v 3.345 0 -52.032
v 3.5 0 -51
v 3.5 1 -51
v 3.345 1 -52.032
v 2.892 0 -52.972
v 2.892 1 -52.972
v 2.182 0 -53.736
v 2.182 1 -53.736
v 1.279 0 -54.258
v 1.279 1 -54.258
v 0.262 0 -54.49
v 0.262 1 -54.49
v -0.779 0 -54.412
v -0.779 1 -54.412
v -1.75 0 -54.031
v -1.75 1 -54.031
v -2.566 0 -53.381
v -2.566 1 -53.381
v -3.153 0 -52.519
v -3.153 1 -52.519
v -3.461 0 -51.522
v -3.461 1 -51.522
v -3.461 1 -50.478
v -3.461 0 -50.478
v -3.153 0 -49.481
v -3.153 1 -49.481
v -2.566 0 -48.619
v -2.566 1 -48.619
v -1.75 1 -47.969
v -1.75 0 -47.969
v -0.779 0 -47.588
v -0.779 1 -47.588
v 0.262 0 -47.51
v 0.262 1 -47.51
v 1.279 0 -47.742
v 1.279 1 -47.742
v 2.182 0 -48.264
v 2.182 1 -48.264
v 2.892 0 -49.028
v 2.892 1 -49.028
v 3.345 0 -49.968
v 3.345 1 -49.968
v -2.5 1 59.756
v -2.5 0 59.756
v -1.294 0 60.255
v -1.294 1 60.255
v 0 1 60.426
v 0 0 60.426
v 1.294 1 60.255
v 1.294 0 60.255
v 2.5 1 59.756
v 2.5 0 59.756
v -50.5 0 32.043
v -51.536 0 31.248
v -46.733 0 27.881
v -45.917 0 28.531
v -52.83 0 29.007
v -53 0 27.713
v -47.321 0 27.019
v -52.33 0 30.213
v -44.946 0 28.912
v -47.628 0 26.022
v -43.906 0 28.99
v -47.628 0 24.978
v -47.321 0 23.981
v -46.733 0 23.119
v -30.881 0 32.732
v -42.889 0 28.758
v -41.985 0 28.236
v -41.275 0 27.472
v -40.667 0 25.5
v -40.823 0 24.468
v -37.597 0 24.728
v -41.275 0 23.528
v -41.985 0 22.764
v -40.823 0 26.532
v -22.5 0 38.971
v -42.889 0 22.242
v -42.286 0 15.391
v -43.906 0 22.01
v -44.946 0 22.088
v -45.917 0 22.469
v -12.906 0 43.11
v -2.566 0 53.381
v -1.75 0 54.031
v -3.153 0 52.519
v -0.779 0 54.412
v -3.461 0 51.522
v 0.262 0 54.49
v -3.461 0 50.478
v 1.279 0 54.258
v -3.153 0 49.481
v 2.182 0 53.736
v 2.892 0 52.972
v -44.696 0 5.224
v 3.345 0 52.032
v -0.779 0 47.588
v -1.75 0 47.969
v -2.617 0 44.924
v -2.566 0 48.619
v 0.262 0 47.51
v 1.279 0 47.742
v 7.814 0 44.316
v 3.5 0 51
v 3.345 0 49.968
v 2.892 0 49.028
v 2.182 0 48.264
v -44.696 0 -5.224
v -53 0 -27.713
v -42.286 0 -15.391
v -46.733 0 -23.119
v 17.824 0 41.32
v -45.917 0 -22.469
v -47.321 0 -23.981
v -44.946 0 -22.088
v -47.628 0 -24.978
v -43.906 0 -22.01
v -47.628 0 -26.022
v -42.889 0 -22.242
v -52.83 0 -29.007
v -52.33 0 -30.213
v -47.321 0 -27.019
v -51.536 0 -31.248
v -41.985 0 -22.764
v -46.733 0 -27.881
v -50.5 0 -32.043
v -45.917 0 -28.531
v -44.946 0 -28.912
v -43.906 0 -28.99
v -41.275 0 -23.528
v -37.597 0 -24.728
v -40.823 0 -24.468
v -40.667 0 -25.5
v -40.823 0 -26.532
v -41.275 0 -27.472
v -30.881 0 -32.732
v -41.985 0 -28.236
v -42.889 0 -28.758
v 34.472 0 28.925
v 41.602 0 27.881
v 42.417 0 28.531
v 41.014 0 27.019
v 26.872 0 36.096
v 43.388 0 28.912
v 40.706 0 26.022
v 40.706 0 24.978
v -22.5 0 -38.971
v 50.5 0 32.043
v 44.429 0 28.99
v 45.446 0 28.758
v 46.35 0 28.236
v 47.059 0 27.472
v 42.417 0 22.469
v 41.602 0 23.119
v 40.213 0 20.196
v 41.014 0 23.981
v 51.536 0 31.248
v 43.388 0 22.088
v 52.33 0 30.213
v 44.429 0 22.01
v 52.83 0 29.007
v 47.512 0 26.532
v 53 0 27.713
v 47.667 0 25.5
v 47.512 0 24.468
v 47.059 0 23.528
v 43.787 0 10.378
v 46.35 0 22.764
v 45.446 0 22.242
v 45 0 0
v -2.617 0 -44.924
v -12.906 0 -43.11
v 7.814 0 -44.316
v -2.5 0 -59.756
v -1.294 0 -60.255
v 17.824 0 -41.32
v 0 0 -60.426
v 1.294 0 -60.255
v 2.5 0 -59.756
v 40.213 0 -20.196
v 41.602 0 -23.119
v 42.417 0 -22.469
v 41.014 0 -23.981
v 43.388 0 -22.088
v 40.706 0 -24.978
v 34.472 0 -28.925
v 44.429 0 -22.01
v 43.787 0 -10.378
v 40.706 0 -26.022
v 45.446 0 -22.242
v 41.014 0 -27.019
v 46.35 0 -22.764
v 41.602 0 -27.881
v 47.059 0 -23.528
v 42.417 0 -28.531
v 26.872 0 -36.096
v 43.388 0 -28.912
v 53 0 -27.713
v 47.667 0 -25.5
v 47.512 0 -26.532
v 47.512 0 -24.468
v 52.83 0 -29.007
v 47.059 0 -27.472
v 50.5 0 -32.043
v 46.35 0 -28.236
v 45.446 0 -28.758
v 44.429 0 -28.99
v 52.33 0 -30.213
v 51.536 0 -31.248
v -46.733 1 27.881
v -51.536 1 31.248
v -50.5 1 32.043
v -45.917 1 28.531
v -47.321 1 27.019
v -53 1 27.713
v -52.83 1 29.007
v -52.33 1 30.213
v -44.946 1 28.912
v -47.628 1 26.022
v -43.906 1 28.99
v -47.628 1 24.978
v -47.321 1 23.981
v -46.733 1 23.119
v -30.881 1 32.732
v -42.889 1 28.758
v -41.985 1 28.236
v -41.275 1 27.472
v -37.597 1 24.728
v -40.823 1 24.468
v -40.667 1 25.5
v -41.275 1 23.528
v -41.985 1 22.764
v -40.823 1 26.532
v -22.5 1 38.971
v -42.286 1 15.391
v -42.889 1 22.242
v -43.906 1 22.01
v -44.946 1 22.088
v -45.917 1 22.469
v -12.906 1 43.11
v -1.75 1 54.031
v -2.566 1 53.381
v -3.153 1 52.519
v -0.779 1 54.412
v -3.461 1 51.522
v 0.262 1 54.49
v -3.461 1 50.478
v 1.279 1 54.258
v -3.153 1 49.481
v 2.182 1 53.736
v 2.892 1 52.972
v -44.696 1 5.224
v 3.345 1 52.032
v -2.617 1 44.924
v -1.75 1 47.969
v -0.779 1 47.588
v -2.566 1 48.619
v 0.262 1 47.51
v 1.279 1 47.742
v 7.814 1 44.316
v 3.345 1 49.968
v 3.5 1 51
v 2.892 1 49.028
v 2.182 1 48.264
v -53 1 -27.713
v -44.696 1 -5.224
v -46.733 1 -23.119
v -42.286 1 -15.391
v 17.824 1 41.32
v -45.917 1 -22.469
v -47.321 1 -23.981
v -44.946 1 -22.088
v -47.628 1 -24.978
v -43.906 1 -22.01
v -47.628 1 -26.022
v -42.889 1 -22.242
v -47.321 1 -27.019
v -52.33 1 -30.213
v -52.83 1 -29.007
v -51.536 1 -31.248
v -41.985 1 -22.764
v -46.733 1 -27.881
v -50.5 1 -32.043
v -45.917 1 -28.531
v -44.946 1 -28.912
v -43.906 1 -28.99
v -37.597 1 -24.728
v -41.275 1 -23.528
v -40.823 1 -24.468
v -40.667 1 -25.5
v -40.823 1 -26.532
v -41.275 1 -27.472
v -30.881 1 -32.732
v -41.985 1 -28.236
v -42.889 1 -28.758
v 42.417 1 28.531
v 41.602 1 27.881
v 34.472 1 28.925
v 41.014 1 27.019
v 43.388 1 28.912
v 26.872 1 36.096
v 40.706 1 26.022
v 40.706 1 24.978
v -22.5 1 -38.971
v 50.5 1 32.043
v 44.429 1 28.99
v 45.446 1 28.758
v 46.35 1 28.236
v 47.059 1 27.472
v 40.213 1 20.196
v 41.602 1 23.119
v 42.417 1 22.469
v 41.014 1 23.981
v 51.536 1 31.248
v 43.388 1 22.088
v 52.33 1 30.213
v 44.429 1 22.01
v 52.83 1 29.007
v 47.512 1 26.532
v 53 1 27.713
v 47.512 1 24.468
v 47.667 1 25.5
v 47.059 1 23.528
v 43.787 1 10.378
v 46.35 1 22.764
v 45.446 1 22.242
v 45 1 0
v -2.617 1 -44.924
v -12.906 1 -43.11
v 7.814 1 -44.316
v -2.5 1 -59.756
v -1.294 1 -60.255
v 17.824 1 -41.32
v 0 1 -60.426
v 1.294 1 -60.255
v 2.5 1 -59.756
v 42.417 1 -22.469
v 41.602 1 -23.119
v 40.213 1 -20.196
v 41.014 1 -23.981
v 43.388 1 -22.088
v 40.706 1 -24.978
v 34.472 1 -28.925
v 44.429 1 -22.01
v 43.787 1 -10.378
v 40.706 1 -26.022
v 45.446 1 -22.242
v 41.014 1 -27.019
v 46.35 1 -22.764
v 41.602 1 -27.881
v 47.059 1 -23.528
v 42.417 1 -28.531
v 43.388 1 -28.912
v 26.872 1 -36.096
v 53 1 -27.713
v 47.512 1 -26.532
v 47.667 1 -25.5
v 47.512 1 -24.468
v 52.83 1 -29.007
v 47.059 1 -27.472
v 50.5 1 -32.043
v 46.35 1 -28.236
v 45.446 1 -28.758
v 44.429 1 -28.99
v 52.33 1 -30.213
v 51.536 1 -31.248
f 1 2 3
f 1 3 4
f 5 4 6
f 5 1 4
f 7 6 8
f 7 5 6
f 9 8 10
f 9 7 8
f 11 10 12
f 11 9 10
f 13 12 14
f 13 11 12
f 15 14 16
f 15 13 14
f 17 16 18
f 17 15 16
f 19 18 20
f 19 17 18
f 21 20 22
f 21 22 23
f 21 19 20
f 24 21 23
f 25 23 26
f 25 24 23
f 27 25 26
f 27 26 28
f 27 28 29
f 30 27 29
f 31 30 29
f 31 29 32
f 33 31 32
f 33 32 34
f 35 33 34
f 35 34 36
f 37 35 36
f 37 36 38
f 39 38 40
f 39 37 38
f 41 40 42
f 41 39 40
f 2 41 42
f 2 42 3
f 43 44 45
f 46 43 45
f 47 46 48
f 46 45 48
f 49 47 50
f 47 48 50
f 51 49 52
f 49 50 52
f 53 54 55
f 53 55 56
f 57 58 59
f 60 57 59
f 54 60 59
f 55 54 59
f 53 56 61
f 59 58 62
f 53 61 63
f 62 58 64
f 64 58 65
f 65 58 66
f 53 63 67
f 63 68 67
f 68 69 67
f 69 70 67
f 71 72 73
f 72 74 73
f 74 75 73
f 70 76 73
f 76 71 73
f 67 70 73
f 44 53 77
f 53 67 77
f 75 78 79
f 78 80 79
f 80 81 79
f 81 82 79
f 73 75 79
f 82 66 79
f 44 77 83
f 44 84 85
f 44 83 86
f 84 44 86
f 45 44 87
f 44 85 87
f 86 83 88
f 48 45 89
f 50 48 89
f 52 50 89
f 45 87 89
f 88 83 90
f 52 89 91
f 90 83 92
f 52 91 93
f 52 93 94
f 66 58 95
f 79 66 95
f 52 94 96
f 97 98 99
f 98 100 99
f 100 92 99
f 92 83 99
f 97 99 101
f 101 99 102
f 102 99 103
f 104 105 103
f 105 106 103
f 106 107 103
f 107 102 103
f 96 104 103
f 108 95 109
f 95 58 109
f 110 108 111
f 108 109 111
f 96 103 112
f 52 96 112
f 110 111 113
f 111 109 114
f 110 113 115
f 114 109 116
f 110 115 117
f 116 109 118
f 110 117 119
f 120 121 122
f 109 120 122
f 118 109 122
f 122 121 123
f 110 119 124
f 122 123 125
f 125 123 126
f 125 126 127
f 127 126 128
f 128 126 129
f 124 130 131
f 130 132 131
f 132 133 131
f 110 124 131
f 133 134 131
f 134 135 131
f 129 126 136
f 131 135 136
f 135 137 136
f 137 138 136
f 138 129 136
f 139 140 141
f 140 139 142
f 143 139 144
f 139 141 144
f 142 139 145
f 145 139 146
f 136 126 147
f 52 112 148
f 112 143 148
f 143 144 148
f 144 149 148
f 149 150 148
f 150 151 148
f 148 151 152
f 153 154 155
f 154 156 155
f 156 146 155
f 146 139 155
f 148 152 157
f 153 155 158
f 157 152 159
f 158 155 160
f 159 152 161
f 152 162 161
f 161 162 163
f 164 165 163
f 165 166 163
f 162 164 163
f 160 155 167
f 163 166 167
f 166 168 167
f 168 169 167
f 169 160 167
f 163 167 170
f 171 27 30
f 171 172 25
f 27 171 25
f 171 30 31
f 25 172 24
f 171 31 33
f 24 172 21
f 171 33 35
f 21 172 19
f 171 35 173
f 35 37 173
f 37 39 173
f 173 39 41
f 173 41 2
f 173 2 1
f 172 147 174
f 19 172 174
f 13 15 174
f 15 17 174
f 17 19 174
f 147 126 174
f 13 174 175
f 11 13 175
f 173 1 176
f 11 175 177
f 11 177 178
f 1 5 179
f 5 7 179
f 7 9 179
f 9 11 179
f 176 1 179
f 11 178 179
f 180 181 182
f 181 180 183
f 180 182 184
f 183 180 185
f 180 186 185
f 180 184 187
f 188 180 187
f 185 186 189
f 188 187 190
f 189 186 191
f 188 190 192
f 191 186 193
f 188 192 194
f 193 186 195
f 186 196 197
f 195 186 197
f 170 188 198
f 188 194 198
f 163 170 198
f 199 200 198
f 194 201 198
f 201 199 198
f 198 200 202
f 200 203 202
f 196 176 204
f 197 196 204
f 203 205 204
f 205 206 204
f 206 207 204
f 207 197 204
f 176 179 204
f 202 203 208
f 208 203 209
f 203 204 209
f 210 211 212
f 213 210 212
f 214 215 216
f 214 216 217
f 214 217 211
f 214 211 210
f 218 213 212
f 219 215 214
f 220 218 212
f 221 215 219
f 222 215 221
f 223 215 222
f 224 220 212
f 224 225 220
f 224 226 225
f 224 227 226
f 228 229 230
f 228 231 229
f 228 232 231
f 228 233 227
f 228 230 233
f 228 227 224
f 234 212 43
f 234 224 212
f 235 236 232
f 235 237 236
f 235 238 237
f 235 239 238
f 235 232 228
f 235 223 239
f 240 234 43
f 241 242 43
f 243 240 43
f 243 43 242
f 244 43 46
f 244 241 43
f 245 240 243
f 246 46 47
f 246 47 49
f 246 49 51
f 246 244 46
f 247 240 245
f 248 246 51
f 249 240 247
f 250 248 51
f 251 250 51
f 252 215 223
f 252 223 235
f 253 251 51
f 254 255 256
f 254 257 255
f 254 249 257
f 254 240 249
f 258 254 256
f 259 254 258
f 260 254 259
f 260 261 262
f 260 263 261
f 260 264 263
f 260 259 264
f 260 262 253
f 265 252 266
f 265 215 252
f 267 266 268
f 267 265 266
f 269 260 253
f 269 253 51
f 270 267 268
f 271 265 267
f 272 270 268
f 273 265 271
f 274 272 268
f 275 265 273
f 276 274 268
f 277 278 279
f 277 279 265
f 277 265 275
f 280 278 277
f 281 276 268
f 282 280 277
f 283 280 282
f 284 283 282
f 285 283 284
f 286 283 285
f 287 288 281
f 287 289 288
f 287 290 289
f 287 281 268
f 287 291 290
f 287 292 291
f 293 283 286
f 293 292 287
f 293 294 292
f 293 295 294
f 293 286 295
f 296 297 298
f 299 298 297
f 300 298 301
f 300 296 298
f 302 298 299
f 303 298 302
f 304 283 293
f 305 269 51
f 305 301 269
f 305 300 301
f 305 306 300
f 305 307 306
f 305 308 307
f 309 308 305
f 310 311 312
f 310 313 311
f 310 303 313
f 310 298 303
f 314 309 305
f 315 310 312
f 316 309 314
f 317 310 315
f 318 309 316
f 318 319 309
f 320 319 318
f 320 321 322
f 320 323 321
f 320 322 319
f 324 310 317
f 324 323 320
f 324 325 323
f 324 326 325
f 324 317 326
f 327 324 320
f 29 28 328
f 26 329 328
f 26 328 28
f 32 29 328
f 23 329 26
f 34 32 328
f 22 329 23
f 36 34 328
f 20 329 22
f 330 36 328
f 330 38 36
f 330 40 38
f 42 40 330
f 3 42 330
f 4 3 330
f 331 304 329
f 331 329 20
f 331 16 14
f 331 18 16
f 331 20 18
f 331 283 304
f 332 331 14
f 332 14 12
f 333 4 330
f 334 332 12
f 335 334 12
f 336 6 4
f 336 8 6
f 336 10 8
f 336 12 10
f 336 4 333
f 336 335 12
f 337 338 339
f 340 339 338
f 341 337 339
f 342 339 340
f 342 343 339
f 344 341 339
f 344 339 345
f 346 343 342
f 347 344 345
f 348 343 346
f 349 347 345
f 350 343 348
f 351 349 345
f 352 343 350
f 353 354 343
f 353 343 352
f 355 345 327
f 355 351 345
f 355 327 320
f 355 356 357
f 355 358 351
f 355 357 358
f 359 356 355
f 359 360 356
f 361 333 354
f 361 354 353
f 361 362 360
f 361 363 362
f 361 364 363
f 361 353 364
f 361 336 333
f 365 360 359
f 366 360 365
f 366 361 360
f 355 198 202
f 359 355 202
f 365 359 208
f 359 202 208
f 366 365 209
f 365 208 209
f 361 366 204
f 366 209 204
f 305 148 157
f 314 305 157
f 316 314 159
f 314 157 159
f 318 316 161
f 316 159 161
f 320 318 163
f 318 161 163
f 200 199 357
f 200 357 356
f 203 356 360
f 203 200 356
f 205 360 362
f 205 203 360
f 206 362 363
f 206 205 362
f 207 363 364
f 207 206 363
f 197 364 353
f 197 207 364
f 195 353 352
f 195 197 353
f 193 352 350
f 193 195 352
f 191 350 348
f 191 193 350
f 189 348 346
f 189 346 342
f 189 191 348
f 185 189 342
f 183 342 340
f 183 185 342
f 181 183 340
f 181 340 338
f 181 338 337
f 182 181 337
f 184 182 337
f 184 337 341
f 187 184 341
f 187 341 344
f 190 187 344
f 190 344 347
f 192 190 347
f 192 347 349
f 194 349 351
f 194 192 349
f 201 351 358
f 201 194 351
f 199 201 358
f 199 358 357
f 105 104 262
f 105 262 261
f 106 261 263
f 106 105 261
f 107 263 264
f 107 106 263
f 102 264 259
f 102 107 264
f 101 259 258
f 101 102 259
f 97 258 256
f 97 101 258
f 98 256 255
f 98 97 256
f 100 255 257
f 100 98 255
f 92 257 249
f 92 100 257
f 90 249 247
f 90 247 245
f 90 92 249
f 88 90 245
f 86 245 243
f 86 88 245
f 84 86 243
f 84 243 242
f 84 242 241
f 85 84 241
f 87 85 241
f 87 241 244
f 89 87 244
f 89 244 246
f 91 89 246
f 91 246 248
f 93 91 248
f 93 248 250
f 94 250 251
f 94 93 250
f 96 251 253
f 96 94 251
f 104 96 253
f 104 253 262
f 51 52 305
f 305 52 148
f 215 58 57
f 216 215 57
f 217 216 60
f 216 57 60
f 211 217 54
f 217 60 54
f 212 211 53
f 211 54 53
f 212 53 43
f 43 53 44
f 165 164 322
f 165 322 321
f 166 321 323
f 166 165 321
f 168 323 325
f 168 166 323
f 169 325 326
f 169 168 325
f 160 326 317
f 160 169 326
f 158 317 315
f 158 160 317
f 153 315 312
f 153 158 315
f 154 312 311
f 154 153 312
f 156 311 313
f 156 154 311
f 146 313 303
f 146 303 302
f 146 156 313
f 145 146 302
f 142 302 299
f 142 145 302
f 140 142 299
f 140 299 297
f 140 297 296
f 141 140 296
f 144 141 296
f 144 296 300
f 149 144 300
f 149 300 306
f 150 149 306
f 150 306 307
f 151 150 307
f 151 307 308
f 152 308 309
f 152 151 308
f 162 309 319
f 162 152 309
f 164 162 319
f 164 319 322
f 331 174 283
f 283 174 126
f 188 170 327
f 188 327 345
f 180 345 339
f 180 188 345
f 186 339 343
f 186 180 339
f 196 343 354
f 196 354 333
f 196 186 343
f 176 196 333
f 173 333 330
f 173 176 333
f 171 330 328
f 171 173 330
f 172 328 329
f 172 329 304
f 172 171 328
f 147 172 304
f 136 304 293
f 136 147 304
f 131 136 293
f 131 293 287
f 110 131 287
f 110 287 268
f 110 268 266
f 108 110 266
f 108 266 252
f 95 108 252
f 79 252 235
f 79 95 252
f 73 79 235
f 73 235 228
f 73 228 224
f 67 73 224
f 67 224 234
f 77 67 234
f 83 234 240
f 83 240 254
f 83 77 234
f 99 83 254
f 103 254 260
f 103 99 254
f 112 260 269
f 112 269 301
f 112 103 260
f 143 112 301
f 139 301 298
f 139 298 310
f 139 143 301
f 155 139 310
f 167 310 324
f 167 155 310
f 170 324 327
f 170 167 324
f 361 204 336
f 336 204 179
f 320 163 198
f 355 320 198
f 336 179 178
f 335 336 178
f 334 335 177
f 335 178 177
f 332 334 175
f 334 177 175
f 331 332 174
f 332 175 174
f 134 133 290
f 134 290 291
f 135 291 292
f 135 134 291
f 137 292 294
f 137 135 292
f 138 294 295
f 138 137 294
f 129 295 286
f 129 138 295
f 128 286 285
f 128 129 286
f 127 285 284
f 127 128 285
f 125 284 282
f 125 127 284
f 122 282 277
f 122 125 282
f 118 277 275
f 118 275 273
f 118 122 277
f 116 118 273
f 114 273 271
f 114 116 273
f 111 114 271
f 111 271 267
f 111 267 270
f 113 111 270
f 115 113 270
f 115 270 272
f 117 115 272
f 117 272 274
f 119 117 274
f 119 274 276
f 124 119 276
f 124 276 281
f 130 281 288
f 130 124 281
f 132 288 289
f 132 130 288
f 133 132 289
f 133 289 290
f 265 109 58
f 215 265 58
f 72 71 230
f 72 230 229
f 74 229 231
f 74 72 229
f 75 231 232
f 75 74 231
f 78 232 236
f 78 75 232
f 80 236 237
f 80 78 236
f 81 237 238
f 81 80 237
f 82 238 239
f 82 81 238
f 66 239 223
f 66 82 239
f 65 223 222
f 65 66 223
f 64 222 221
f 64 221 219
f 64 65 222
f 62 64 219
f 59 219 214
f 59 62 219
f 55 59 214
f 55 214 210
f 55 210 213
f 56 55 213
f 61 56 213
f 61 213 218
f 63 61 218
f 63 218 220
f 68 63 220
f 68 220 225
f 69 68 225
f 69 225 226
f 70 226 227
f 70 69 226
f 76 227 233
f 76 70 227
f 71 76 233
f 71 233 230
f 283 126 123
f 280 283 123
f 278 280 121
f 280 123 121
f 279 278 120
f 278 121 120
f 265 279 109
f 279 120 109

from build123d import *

# Parameters (mm, degrees)
SKETCH1_R           = 45
SKETCH1_R_2         = 3.5
BOSS_EXTRUDE1_DEPTH = 1


with BuildPart() as part:
    # Sketch1 → Boss-Extrude1 (new body)
    with BuildSketch(Plane(origin=(0, 0, 0), x_dir=(1, 0, 0), z_dir=(0, 1, 0))):
        with BuildLine():
            Line((-2.5, 59.755752861), (-50.5, 32.04293994))
            ThreePointArc((-50.5, 32.04293994), (-52.330127019, 30.212812921), (-53, 27.712812921))
            Line((-53, 27.712812921), (-53, -27.712812921))
            ThreePointArc((-53, -27.712812921), (-52.330127019, -30.212812921), (-50.5, -32.04293994))
            Line((-50.5, -32.04293994), (-2.5, -59.755752861))
            ThreePointArc((-2.5, -59.755752861), (0, -60.425625842), (2.5, -59.755752861))
            Line((2.5, -59.755752861), (50.5, -32.04293994))
            ThreePointArc((50.5, -32.04293994), (52.330127019, -30.212812921), (53, -27.712812921))
            Line((53, -27.712812921), (53, 27.712812921))
            ThreePointArc((53, 27.712812921), (52.330127019, 30.212812921), (50.5, 32.04293994))
            Line((50.5, 32.04293994), (2.5, 59.755752861))
            ThreePointArc((2.5, 59.755752861), (0, 60.425625842), (-2.5, 59.755752861))
        make_face()
        Circle(SKETCH1_R, mode=Mode.SUBTRACT)
        with Locations((0, 51)):
            Circle(SKETCH1_R_2, mode=Mode.SUBTRACT)
        with Locations((44.167295593, 25.5)):
            Circle(SKETCH1_R_2, mode=Mode.SUBTRACT)
        with Locations((44.167295593, -25.5)):
            Circle(SKETCH1_R_2, mode=Mode.SUBTRACT)
        with Locations((0, -51)):
            Circle(SKETCH1_R_2, mode=Mode.SUBTRACT)
        with Locations((-44.167295593, -25.5)):
            Circle(SKETCH1_R_2, mode=Mode.SUBTRACT)
        with Locations((-44.167295593, 25.5)):
            Circle(SKETCH1_R_2, mode=Mode.SUBTRACT)
    extrude(amount=BOSS_EXTRUDE1_DEPTH)


solid = part.part
